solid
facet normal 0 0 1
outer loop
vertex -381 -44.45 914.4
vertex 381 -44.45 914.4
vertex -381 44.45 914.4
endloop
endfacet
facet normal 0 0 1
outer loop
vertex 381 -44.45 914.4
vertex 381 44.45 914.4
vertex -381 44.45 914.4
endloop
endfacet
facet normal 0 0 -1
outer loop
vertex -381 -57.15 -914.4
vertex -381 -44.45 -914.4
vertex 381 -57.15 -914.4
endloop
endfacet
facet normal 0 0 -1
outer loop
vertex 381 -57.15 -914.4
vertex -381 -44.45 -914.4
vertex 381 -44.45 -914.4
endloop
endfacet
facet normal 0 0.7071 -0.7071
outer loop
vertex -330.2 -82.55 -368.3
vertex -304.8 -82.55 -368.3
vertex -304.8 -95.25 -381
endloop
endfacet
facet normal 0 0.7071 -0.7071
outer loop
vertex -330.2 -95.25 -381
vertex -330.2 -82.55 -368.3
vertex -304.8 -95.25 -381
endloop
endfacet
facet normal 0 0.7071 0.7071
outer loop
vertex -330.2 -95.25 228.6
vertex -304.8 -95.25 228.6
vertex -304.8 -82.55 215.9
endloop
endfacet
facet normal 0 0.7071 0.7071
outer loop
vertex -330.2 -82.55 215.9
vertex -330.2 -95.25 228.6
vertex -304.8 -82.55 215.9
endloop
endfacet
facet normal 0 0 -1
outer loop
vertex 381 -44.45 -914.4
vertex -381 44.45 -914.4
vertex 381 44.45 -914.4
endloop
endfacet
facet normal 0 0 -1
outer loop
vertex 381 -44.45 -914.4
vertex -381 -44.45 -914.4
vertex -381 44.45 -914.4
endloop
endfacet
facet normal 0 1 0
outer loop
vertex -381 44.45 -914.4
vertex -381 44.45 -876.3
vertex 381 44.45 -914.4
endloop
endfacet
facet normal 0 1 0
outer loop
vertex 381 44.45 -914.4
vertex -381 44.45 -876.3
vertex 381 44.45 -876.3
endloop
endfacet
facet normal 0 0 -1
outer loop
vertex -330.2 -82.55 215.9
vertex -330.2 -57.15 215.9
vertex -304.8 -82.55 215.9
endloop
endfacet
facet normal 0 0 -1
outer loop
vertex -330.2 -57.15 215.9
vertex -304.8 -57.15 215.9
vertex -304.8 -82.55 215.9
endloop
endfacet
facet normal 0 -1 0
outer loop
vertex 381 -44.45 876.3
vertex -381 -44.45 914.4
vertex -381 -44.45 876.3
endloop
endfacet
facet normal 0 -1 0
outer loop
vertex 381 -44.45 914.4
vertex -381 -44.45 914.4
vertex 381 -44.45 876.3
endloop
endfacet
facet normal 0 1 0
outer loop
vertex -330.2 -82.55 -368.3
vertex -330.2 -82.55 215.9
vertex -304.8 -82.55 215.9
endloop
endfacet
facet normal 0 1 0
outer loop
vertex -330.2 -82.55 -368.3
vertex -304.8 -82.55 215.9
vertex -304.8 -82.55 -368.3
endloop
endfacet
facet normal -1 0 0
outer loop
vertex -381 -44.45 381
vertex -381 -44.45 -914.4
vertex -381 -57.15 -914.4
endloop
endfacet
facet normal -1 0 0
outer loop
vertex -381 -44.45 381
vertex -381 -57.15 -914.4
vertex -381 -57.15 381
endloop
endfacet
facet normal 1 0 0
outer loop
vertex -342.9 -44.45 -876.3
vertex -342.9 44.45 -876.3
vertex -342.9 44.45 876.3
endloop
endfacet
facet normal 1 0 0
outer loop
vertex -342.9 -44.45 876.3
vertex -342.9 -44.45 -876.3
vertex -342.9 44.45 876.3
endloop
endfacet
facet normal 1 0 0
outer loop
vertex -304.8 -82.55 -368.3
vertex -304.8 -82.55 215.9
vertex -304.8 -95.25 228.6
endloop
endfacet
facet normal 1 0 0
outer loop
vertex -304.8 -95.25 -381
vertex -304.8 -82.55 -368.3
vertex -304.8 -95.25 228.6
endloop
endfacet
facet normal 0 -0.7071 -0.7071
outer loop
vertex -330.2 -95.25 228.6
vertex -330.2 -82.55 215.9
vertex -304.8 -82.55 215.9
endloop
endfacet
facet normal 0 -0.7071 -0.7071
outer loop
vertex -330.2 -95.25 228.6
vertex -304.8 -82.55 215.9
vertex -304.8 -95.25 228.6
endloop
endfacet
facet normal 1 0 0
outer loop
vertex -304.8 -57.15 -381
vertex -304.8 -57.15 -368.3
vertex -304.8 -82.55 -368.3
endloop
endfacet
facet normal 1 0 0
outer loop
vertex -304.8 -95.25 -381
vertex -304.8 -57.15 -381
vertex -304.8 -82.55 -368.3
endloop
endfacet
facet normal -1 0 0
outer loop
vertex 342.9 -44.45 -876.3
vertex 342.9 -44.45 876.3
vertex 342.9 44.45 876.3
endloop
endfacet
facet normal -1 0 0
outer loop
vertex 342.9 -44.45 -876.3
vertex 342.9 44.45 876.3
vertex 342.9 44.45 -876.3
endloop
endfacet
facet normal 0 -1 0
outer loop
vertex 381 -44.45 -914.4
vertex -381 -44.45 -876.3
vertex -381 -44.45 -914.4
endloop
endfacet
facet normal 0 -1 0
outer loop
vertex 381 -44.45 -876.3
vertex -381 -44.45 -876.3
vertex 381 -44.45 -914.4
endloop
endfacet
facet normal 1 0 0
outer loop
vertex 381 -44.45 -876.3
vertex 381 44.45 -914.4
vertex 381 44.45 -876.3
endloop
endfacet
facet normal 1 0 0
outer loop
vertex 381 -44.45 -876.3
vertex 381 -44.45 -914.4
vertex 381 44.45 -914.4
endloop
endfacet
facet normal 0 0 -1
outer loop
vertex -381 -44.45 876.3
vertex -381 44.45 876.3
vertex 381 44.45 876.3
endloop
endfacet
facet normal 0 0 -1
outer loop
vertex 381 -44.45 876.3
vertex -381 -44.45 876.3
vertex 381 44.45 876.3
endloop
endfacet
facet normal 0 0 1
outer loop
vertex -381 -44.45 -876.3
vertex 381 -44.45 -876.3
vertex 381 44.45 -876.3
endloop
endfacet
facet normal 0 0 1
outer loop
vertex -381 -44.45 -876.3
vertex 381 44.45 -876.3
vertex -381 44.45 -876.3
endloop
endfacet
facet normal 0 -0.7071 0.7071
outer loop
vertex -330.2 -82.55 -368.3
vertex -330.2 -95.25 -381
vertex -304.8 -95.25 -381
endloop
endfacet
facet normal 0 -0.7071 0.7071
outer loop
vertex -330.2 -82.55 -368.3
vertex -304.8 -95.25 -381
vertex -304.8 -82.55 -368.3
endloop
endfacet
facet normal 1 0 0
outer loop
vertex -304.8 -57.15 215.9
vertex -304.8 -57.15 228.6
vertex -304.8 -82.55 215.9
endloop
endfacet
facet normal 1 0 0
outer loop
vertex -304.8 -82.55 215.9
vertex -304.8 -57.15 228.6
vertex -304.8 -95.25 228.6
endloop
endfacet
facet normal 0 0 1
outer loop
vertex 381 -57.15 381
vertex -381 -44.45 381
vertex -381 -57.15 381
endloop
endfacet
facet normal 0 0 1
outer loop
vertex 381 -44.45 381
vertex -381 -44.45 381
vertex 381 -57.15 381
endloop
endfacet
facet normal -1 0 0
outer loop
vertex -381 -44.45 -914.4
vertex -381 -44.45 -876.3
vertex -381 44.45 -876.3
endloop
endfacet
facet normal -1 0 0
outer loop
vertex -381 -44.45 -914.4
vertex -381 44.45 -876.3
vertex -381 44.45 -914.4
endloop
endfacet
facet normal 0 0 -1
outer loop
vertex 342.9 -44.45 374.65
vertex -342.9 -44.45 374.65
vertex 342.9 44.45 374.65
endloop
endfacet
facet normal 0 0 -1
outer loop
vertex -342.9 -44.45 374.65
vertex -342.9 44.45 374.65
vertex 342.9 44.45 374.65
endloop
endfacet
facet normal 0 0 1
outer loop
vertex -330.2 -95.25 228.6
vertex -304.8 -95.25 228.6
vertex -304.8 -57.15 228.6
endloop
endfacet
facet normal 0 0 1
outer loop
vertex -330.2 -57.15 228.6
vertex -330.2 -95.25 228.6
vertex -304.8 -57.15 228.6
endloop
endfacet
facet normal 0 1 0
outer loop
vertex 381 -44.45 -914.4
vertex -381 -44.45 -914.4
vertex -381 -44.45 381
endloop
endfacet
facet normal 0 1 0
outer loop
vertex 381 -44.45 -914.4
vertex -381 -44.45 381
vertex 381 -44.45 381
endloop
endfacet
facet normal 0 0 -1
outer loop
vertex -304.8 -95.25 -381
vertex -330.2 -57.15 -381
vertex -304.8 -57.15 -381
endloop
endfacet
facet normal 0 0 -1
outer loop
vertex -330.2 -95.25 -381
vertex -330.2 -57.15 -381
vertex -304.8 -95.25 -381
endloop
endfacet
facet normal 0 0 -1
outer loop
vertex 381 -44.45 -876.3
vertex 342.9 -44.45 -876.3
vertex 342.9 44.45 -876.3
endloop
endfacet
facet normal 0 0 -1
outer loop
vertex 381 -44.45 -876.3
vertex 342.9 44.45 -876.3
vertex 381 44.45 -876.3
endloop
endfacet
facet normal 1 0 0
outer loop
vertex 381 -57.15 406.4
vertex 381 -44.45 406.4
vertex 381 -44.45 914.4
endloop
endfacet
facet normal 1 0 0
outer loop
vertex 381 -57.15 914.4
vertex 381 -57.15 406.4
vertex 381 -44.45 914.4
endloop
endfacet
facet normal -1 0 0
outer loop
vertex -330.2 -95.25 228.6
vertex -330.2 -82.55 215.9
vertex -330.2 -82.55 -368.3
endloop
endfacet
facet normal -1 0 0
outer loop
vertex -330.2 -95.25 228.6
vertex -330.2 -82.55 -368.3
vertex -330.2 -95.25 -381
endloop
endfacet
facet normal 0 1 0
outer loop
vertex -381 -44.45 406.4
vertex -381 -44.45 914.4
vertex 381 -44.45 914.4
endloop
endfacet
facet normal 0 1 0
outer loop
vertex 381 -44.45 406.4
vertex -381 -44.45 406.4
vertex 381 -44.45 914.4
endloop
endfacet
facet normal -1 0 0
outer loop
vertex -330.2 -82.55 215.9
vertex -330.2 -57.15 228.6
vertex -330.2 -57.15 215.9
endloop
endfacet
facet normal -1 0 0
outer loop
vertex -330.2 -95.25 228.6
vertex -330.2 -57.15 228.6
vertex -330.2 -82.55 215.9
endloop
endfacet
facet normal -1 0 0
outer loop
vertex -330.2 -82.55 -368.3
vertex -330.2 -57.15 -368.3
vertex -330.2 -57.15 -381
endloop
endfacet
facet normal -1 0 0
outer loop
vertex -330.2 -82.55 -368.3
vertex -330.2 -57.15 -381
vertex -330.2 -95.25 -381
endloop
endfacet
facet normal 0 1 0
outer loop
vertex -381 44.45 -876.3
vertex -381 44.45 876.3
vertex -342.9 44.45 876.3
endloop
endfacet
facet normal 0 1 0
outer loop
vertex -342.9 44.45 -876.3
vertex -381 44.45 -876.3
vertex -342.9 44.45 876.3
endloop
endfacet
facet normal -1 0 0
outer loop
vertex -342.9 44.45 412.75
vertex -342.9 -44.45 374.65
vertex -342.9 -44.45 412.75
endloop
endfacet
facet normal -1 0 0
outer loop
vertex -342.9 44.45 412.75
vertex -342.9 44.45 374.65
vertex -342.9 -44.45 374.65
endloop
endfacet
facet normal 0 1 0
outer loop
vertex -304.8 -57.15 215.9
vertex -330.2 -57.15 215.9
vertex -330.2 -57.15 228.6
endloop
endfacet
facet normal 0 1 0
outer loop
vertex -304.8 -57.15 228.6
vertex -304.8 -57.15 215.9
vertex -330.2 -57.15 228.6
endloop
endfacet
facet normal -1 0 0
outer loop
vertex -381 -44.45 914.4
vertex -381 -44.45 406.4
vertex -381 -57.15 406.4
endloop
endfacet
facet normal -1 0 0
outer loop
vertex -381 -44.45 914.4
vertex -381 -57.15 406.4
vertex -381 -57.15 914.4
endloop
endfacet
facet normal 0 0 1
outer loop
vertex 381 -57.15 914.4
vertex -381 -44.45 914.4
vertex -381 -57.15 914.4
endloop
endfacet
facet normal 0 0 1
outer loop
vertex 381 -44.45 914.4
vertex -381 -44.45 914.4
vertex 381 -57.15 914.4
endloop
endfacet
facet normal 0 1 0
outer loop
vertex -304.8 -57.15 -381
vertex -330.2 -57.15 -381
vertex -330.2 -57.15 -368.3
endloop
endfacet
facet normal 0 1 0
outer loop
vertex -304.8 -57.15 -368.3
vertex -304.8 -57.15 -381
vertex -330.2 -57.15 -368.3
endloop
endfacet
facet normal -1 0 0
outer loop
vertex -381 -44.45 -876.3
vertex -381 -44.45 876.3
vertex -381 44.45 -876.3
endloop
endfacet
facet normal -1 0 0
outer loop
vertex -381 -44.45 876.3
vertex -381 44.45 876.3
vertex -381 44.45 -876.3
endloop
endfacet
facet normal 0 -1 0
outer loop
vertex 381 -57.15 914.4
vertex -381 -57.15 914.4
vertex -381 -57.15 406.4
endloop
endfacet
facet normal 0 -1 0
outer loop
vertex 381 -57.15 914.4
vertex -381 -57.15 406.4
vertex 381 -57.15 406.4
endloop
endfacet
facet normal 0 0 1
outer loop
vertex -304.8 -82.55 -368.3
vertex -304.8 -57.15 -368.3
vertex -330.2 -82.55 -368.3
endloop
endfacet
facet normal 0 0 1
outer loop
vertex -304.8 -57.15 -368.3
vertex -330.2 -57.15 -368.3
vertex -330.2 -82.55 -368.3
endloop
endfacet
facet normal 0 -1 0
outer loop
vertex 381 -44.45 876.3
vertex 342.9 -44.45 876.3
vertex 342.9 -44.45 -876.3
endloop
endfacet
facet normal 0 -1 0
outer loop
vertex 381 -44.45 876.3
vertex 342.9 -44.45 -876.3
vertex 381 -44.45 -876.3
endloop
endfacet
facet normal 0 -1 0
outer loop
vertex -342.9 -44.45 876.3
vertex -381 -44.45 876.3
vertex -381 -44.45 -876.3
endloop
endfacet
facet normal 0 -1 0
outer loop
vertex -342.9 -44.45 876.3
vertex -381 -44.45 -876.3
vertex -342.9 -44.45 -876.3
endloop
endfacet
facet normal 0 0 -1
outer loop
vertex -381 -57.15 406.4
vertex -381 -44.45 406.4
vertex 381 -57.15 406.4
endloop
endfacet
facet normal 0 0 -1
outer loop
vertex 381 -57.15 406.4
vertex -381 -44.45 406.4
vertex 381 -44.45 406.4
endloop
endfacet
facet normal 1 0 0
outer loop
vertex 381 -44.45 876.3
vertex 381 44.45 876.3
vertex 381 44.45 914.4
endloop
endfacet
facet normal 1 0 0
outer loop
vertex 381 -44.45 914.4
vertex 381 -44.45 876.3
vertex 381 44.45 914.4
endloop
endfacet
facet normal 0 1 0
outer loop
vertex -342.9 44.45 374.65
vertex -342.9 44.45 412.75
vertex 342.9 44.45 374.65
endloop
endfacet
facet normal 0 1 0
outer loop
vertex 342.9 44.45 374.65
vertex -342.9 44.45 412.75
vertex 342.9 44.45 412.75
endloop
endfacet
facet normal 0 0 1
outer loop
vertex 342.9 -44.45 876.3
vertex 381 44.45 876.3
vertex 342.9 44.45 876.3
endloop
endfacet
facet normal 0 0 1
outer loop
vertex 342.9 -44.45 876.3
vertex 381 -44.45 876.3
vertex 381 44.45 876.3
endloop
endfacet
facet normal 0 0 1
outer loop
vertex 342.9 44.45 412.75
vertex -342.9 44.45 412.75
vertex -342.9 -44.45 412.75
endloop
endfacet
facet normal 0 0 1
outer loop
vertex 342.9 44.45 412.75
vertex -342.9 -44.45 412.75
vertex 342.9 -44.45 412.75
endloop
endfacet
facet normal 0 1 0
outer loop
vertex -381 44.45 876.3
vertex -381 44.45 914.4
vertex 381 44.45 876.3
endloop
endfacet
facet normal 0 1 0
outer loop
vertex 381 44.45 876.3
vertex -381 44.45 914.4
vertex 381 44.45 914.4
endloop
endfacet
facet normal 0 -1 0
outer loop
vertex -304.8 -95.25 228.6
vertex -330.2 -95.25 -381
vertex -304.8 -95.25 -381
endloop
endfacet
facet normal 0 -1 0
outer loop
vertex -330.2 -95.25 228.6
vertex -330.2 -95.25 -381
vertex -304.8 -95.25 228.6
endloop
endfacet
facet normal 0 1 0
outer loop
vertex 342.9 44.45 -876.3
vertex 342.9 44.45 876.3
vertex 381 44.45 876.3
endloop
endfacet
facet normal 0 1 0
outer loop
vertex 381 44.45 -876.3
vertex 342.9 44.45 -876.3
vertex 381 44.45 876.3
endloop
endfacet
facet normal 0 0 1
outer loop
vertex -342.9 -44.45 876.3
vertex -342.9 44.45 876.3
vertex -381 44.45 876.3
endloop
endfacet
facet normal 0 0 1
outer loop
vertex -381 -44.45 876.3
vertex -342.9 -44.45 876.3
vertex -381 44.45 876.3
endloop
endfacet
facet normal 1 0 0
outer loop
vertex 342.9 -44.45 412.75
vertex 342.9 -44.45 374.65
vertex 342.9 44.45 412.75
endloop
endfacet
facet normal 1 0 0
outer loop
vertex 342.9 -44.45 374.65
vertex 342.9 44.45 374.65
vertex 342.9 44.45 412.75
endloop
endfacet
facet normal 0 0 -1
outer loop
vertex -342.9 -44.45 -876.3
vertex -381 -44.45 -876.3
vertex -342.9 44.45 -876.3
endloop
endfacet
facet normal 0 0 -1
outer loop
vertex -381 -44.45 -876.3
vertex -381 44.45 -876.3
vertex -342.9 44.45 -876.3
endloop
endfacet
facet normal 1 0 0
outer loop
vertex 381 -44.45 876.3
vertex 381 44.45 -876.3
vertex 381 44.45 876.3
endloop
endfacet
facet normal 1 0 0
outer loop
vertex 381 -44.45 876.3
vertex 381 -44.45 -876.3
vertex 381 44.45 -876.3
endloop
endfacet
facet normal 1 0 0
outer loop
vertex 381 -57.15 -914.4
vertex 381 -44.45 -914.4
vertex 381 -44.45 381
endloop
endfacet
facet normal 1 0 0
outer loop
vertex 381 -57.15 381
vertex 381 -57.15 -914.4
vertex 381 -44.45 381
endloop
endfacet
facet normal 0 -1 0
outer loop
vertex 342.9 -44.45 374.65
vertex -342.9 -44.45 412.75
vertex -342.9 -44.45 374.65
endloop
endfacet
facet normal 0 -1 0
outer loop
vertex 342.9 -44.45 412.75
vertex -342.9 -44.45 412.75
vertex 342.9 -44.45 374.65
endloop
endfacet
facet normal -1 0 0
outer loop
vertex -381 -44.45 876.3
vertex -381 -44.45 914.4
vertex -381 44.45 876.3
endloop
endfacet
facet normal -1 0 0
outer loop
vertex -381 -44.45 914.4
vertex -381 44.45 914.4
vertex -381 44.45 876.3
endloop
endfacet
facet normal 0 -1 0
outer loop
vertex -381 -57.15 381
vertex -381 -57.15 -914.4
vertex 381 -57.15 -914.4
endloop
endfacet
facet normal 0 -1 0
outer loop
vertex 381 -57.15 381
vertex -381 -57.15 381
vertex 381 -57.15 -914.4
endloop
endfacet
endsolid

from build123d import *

# Parameters (mm, degrees)
F0_W      = 685.8
F0_H      = 38.1
F1_DEPTH  = 44.45
F2_DEPTH  = 44.45
F3_W      = 762
F3_H      = 508
F4_DEPTH  = 12.7
F5_W      = 762
F5_H      = 1295.4
F6_DEPTH  = 12.7
F8_W      = 25.4
F8_H      = 12.7
F9_DEPTH  = 12.7
F10_DEPTH = 12.7


with BuildPart() as f1:
    # F0 (on Front) → F1 (new body, symmetric)
    with BuildSketch(Plane.XZ):
        Polygon((-342.9, 876.3), (342.9, 876.3), (381, 876.3), (381, 914.4), (-381, 914.4), (-381, 876.3), align=None)
        with Locations((0, 393.7)):
            Rectangle(F0_W, F0_H)
        Polygon((381, -914.4), (381, -876.3), (342.9, -876.3), (-342.9, -876.3), (-381, -876.3), (-381, -914.4), align=None)
    extrude(amount=F1_DEPTH, both=True)


with BuildPart() as f2:
    # F0 (on Front) → F2 (new body, symmetric)
    with BuildSketch(Plane.XZ):
        Polygon((-342.9, 412.75), (-342.9, 876.3), (-381, 876.3), (-381, -876.3), (-342.9, -876.3), (-342.9, 374.65), align=None)
        Polygon((381, 876.3), (342.9, 876.3), (342.9, 412.75), (342.9, 374.65), (342.9, -876.3), (381, -876.3), align=None)
    extrude(amount=F2_DEPTH, both=True)


with BuildPart() as f4:
    # F3 (on face) → F4 (new body)
    with BuildSketch(Plane.XZ.offset(44.45)):
        with Locations((0, 660.4)):
            Rectangle(F3_W, F3_H)
    extrude(amount=F4_DEPTH)


with BuildPart() as f6:
    # F5 (on face) → F6 (new body)
    with BuildSketch(Plane.XZ.offset(44.45)):
        with Locations((0, -266.7)):
            Rectangle(F5_W, F5_H)
    extrude(amount=F6_DEPTH)


with BuildPart() as f9:
    # F8 (on offset) → F9 (new body, symmetric)
    with BuildSketch(Plane(origin=(-317.5, 0, 0), x_dir=(0, -1, 0), z_dir=(-1, 0, 0))):
        with Locations((69.85, 222.25)):
            Rectangle(F8_W, F8_H)
        Polygon((82.55, 228.6), (82.55, 215.9), (95.25, 228.6), align=None)
        with Locations((69.85, -374.65)):
            Rectangle(F8_W, F8_H)
        Polygon((95.25, -381), (82.55, -368.3), (82.55, -381), align=None)
    extrude(amount=F9_DEPTH, both=True)


with BuildPart() as f10:
    # F8 (on offset) → F10 (new body, symmetric)
    with BuildSketch(Plane(origin=(-317.5, 0, 0), x_dir=(0, -1, 0), z_dir=(-1, 0, 0))):
        Polygon((95.25, 228.6), (82.55, 215.9), (82.55, -368.3), (95.25, -381), align=None)
    extrude(amount=F10_DEPTH, both=True)


solid = Compound([f1.part, f2.part, f4.part, f6.part, f9.part, f10.part])
